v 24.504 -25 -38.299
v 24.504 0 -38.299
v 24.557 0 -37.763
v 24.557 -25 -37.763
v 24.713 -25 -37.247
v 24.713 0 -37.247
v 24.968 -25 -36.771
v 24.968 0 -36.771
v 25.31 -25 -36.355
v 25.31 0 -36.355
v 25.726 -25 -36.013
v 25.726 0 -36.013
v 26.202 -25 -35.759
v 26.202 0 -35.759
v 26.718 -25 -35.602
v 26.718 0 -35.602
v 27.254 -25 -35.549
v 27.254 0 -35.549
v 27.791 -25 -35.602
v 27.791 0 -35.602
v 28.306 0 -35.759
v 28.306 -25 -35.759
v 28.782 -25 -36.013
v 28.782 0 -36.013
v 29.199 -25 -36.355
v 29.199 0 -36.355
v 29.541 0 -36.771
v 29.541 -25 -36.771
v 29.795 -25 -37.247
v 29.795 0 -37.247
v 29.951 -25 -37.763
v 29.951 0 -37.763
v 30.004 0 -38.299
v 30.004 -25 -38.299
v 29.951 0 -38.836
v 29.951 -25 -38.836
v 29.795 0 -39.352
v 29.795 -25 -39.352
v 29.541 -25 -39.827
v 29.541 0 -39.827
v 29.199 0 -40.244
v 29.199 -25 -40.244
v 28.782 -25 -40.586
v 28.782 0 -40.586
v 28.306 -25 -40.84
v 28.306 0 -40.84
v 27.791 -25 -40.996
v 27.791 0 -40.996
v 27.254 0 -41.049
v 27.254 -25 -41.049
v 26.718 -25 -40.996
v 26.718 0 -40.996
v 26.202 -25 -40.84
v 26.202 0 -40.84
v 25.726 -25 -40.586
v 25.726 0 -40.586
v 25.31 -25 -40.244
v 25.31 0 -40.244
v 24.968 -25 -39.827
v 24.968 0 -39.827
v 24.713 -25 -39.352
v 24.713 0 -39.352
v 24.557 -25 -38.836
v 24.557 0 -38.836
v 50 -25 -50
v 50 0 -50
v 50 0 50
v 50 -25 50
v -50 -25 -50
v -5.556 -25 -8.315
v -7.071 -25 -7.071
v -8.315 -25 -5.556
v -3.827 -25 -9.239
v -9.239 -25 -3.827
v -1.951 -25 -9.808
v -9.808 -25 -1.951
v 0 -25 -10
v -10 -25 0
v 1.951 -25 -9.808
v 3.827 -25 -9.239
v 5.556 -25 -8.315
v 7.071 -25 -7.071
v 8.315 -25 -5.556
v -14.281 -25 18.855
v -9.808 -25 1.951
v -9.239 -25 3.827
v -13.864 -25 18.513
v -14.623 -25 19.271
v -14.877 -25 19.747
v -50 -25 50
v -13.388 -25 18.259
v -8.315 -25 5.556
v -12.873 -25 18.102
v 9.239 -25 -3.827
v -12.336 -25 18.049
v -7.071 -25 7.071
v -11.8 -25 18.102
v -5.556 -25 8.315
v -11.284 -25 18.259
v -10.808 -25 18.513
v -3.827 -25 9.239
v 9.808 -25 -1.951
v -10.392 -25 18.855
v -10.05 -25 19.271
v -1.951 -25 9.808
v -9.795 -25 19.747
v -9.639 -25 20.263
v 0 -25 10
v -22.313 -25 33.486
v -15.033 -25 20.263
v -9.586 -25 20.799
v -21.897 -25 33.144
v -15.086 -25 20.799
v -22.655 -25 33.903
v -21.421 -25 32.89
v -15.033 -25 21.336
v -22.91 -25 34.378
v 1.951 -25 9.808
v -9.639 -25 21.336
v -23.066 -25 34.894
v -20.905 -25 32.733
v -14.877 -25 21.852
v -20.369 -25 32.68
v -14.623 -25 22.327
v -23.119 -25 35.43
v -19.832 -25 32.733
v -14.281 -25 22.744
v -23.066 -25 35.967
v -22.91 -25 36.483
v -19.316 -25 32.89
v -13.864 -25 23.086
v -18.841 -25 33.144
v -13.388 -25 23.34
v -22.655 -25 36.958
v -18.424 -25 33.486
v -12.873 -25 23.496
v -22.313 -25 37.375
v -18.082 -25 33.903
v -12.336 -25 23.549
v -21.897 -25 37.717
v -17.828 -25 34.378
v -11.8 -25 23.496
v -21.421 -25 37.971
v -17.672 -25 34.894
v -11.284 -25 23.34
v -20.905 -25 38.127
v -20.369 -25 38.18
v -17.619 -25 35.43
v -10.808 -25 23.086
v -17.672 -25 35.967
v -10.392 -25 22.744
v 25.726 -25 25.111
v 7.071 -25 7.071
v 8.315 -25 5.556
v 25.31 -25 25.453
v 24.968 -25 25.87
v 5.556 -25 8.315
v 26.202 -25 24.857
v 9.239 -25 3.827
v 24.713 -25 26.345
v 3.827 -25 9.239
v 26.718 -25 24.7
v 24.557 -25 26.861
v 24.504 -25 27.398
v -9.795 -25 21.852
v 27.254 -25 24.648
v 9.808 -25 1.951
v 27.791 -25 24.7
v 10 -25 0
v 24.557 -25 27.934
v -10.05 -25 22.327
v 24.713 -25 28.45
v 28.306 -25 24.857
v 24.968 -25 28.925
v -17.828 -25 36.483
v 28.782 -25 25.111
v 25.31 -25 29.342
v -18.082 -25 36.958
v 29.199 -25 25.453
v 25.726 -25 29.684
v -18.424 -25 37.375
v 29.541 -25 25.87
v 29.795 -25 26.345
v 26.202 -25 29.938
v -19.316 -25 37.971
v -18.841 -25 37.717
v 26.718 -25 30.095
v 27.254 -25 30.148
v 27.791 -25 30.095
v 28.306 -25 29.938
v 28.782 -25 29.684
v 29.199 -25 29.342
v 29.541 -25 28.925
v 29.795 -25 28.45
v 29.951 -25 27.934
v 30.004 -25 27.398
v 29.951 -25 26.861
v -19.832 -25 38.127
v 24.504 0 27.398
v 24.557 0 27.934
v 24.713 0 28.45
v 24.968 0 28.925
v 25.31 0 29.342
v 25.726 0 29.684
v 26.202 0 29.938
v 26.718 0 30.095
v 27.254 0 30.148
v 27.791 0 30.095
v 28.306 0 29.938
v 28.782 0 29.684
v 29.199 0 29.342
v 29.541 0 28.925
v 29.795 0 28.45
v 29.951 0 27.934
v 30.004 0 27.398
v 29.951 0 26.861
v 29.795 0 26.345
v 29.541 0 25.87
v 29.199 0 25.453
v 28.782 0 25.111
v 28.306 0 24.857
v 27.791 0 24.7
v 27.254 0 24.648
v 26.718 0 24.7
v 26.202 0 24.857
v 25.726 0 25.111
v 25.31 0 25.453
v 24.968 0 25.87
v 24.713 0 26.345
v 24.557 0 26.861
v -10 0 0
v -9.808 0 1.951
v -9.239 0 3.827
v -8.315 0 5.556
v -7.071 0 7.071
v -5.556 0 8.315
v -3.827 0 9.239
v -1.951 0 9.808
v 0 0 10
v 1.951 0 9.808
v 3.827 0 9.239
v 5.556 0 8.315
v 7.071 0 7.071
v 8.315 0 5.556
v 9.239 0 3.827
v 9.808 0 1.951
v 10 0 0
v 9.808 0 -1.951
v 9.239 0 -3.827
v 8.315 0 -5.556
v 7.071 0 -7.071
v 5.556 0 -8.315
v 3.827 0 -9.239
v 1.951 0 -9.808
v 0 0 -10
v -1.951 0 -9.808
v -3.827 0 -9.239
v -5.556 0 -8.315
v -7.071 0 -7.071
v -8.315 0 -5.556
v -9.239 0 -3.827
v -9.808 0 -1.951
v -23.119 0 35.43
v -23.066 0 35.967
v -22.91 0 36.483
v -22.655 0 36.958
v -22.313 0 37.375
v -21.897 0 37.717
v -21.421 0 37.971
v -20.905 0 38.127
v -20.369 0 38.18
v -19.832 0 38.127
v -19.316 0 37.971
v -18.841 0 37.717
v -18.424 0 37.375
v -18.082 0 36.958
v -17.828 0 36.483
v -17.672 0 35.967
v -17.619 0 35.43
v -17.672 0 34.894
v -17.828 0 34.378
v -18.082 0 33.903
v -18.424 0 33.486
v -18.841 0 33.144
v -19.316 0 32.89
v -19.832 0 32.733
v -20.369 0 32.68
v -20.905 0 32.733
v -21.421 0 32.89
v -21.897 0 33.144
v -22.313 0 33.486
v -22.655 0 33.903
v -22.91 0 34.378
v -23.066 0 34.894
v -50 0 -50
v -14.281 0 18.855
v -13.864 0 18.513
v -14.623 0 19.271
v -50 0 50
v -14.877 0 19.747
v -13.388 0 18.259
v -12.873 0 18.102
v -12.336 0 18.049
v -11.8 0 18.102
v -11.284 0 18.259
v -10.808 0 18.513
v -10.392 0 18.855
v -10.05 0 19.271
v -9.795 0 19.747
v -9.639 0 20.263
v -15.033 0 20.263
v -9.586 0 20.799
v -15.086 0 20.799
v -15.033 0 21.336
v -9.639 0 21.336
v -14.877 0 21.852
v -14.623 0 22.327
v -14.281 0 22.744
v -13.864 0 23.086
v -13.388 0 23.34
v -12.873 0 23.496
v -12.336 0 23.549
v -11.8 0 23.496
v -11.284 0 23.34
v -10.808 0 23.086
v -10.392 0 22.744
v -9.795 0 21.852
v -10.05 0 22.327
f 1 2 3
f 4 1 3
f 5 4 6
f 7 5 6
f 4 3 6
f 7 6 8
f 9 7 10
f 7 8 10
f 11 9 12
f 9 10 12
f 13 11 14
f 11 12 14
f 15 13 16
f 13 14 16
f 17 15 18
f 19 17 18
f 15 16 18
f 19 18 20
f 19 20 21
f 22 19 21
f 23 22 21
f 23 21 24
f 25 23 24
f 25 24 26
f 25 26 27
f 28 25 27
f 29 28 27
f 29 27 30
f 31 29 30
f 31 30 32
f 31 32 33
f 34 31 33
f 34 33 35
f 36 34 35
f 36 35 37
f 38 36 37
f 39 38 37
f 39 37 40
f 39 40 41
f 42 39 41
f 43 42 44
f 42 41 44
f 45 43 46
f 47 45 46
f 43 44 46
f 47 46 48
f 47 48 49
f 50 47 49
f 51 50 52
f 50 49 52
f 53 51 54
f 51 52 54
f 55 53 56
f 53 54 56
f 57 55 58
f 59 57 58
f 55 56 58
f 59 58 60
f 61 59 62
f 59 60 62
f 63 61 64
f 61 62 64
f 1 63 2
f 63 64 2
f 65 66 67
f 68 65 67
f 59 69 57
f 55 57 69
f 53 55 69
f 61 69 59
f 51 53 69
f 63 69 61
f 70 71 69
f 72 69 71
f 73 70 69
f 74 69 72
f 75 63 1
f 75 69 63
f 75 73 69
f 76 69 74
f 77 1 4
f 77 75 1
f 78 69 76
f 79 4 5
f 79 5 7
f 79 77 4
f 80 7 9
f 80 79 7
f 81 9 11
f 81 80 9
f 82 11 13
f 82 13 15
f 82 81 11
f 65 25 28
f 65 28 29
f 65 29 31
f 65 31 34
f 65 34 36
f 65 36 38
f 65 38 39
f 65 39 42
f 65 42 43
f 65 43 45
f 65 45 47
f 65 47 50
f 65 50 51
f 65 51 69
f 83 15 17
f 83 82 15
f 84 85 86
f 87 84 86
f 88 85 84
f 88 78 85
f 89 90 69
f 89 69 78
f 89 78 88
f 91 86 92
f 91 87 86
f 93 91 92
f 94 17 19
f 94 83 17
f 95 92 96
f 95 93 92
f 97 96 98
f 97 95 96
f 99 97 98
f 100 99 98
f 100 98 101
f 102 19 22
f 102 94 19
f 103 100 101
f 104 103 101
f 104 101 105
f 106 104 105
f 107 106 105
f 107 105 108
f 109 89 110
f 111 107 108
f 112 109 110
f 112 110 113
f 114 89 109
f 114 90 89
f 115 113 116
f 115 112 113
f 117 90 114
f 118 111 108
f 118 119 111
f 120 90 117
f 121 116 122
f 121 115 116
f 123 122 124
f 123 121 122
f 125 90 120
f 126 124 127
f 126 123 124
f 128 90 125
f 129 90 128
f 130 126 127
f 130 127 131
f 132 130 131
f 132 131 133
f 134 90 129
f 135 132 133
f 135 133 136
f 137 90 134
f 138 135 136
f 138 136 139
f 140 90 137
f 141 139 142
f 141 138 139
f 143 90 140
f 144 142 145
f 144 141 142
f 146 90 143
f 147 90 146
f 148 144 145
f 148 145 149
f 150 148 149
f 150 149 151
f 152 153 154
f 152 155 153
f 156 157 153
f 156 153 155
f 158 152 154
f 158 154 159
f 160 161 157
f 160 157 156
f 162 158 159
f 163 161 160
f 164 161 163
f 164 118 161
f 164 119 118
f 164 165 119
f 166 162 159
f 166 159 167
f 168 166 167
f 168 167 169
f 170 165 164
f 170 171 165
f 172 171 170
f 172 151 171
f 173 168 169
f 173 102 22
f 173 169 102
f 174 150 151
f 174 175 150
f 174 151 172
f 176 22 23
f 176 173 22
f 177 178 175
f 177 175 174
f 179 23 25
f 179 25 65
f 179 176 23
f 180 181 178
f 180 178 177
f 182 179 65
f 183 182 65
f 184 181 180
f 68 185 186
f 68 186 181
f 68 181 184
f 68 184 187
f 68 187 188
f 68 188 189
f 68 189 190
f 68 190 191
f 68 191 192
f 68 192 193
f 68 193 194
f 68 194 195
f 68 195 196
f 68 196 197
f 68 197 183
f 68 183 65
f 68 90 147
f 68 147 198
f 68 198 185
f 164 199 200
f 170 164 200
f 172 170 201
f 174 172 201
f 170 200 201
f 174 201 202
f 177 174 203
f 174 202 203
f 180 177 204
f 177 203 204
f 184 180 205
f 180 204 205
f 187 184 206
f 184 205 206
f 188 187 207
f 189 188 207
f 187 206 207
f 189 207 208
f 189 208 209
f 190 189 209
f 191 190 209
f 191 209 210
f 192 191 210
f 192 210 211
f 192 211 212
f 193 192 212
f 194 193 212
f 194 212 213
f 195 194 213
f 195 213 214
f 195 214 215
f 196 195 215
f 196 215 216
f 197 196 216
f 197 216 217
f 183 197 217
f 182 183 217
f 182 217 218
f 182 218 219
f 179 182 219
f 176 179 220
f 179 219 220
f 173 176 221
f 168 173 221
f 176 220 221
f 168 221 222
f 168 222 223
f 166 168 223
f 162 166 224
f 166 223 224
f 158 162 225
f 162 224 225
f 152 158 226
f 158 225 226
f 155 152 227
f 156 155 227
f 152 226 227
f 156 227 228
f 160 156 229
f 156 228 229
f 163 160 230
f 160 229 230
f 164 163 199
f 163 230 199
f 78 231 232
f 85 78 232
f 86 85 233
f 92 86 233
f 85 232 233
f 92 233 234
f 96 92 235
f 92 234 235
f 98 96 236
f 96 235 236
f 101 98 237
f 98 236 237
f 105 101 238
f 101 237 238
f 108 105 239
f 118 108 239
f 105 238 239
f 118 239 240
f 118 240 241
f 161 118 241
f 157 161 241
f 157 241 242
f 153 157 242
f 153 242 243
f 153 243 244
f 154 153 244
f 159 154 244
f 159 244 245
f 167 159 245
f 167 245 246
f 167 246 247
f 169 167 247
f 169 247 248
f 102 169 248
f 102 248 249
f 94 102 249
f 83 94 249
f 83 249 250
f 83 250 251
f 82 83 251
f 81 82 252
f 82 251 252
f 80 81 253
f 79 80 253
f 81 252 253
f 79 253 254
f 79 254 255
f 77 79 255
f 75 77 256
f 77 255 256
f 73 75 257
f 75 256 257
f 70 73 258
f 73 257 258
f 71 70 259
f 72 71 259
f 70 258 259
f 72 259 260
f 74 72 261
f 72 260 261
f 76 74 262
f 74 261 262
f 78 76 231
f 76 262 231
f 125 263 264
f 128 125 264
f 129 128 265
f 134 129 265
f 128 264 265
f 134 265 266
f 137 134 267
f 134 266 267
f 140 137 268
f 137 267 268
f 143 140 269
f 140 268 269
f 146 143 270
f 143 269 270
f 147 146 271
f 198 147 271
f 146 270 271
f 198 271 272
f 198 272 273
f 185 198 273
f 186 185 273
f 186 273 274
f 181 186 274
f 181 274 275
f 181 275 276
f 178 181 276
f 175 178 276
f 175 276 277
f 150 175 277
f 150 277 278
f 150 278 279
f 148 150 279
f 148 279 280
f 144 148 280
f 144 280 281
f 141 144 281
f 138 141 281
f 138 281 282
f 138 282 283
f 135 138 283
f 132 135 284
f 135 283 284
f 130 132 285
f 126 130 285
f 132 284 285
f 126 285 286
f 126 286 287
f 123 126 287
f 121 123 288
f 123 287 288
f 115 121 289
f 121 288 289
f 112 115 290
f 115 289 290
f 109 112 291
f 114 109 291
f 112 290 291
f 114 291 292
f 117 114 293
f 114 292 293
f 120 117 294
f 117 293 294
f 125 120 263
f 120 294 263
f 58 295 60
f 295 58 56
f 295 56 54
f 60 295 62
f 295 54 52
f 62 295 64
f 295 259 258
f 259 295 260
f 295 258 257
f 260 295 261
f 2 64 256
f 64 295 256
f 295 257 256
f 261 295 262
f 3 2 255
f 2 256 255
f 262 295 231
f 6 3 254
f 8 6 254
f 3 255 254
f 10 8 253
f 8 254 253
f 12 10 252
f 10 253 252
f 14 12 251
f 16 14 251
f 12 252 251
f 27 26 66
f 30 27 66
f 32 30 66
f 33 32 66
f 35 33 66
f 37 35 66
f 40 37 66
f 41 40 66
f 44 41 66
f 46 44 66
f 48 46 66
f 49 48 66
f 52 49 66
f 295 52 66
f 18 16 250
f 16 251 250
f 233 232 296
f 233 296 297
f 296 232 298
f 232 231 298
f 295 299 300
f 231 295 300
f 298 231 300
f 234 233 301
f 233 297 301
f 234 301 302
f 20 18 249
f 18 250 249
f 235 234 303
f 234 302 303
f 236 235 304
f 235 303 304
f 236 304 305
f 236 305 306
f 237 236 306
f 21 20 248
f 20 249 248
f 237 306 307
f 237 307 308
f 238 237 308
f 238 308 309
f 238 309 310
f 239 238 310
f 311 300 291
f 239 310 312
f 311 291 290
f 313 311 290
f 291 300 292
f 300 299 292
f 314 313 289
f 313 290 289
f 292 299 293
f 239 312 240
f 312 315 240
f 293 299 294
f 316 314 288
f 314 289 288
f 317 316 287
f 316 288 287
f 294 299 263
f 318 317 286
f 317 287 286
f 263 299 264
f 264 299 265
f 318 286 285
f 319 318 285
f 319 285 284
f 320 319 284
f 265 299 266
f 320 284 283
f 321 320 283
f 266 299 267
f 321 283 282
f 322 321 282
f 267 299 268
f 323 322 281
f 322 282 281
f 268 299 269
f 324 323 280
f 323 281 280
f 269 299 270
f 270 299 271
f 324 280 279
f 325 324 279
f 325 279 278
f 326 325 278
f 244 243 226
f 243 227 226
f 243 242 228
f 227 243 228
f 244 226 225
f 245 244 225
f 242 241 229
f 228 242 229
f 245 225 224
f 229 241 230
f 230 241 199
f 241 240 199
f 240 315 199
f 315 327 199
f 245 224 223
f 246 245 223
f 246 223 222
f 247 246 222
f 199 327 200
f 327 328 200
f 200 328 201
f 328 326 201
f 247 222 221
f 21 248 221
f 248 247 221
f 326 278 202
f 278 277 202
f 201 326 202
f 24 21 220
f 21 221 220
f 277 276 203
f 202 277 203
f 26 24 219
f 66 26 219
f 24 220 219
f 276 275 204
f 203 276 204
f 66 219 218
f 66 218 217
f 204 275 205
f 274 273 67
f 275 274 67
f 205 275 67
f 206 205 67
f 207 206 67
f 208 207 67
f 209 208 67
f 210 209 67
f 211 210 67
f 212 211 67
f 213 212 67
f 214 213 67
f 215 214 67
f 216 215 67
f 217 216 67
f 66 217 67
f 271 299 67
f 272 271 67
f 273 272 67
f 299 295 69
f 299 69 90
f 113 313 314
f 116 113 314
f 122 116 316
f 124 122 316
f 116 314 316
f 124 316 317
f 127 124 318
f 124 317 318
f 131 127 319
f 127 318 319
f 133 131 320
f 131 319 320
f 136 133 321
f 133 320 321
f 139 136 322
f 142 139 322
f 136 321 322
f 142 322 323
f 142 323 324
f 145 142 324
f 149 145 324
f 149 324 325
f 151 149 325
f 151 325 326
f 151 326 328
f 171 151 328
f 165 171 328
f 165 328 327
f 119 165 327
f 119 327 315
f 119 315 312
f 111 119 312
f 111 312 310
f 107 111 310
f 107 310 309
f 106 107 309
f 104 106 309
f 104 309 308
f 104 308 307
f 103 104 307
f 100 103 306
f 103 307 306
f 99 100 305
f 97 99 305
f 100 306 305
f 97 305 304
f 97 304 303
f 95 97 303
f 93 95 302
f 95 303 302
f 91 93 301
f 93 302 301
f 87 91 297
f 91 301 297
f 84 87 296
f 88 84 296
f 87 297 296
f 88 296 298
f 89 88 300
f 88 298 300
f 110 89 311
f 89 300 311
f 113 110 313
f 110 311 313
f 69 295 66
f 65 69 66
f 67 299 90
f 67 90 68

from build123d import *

# Parameters (mm, degrees)
F0_W     = 100
F0_H     = 100
F1_DEPTH = 25
F3_D     = 20
F6_D     = 5.5


with BuildPart() as f1:
    # F0 (on Front) → F1 (new body)
    with BuildSketch(Plane.XZ):
        Rectangle(F0_W, F0_H)
    extrude(amount=F1_DEPTH)

    # F3 (through all)
    with Locations(Plane.XZ.offset(25)):
        with Locations((0, 0)):
            Hole(F3_D / 2)

    # F6 (through all)
    with Locations(Plane.XZ.offset(25)):
        with Locations((27.2540971637, 27.3975413293), (-12.3360659927, 20.7991823554), (-20.3688535839, 35.4303270578), (27.2540971637, -38.2991805673)):
            Hole(F6_D / 2)


solid = f1.part
